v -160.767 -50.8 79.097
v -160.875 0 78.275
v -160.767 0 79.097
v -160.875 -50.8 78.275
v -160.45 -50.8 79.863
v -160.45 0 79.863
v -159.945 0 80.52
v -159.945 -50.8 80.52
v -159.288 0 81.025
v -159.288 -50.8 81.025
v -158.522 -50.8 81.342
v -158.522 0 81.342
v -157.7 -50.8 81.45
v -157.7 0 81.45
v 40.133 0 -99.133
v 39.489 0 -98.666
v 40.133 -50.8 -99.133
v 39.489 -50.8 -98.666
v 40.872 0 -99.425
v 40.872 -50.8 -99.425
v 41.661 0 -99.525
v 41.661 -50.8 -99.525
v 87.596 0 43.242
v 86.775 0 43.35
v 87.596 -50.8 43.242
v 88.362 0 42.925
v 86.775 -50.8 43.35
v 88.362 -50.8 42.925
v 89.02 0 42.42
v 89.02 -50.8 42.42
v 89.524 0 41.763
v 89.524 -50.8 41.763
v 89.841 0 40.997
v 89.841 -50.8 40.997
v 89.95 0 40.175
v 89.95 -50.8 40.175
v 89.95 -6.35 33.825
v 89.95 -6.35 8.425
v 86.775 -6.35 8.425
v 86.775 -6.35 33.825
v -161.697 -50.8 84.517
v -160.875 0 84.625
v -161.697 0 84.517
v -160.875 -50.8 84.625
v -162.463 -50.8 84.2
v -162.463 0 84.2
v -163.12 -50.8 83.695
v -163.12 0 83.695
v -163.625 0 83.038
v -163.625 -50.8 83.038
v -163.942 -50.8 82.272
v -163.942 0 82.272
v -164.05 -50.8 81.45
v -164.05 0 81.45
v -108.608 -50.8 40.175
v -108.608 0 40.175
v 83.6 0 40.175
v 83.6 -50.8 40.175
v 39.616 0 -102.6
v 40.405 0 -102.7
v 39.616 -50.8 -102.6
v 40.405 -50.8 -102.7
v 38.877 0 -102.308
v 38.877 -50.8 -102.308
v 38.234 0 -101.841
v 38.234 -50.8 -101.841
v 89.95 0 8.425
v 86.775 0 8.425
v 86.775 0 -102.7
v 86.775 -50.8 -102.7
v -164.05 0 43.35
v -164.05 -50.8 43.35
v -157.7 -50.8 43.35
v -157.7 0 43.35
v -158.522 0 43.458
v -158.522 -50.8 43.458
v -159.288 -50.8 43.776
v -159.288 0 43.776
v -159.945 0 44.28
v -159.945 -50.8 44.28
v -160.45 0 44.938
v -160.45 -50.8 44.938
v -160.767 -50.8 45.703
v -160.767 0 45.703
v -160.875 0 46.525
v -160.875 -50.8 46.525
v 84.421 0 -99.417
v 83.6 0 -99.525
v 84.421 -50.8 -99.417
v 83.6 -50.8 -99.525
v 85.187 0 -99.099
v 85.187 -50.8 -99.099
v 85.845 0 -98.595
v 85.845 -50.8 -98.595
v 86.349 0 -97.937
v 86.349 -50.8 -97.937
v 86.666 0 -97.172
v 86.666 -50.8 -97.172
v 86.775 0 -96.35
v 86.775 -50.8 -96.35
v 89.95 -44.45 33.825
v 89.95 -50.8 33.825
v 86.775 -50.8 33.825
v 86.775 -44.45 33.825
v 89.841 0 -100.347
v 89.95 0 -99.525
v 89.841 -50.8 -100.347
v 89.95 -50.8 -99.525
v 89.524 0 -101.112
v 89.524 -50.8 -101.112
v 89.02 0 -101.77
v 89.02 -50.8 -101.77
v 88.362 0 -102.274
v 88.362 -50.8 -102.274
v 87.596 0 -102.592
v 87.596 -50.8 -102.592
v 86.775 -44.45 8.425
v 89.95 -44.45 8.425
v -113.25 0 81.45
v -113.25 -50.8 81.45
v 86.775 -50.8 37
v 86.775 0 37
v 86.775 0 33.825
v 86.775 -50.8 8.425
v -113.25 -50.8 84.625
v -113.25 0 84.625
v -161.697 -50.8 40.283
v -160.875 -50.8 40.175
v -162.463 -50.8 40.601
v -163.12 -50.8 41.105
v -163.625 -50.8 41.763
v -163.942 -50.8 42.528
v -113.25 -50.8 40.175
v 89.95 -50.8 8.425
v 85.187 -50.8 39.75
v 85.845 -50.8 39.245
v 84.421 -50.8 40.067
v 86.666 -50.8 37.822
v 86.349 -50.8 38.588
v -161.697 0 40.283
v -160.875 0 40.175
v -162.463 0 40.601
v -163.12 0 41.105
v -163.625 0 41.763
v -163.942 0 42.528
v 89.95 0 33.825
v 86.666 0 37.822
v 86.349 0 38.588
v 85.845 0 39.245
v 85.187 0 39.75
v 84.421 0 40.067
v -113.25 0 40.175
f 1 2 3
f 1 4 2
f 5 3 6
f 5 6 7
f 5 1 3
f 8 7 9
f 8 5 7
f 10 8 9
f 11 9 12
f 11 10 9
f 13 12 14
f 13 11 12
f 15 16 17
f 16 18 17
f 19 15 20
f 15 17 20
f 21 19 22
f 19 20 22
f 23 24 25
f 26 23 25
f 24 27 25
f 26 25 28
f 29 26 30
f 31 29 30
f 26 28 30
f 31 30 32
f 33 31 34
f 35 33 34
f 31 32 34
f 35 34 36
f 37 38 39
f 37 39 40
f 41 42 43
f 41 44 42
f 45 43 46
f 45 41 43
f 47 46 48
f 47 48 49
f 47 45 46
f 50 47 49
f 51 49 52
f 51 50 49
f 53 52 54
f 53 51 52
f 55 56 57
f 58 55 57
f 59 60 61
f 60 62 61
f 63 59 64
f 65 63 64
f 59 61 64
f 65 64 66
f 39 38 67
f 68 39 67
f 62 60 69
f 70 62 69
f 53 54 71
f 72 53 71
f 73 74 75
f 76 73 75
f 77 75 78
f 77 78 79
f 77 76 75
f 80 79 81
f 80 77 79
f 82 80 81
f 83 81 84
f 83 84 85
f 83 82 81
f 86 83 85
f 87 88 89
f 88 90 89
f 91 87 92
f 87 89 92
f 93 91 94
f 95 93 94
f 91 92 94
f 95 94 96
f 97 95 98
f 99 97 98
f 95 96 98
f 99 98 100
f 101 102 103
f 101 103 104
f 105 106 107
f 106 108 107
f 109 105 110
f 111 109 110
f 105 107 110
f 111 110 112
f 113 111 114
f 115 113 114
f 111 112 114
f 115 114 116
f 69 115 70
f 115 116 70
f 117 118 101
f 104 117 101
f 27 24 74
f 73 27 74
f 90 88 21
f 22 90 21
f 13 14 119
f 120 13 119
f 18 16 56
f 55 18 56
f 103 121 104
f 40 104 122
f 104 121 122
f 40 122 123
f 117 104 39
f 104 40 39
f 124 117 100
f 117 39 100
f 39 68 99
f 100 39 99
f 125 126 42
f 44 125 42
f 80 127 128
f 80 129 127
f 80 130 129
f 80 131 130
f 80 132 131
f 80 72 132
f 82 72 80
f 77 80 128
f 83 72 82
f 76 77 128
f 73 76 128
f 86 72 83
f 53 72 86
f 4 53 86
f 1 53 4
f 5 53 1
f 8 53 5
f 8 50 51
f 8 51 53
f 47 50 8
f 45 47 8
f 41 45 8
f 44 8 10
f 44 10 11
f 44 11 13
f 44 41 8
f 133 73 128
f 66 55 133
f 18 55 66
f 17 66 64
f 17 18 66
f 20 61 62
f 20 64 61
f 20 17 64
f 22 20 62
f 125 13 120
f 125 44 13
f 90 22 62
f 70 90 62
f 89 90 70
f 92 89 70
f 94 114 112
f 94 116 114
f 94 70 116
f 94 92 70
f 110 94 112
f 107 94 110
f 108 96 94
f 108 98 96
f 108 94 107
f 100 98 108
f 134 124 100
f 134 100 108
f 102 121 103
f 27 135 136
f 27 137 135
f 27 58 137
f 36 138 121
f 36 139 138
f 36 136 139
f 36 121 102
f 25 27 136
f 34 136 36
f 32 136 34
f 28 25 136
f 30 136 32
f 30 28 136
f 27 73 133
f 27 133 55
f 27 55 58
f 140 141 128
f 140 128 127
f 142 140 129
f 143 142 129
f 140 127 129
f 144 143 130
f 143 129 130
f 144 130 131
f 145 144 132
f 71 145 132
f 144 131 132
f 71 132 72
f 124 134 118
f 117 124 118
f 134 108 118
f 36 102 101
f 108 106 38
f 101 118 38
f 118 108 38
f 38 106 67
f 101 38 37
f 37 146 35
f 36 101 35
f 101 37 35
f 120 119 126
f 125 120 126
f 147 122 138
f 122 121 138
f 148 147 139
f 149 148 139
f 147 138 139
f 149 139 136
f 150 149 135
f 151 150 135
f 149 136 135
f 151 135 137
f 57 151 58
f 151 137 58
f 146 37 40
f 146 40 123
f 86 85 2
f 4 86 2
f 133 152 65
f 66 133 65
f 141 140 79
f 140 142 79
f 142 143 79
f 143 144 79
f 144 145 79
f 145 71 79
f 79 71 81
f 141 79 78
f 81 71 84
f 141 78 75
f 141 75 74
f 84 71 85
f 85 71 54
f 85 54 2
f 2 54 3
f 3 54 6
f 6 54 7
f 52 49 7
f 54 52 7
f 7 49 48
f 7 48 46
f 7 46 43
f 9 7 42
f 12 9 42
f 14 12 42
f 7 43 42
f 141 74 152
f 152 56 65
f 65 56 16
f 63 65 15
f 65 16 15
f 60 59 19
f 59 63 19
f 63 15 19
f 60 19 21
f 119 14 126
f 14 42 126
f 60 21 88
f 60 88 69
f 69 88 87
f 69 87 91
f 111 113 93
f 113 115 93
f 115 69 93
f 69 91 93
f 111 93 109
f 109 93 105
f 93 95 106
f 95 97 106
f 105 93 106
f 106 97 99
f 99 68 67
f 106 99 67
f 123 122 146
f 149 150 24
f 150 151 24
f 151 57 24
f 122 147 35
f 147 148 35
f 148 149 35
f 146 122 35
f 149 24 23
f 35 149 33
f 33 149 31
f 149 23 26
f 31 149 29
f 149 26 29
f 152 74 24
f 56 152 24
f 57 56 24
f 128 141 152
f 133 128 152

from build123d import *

# Parameters (mm, degrees)
F1_DEPTH = 50.8
F2_R     = 3.175
F4_W     = 6.35
F4_H     = 25.4
F5_DEPTH = 25.4


# Not quite as in the source:
# - two fillets or chamfers of one size are made in one step
# - a feature names something its author has since deleted; it is built from what else it names


with BuildPart() as f1:
    # F0 (on Front) → F1 (new body)
    with BuildSketch(Plane.XZ):
        Polygon((89.9496172311, 43.3501401251), (-160.8753827689, 43.3501401251), (-160.8753827689, 81.4501401251), (-113.2503827689, 81.4501401251), (-113.2503827689, 84.6251401251), (-164.0503827689, 84.6251401251), (-164.0503827689, 40.1751401251), (-113.2503827689, 40.1751401251), (39.1496172311, -102.6998598749), (89.9496172311, -102.6998598749), align=None)
        Polygon((-108.6081703534, 40.1751401251), (86.7746172311, 40.1751401251), (86.7746172311, -99.5248598749), (40.4051629799, -99.5248598749), align=None, mode=Mode.SUBTRACT)
    extrude(amount=F1_DEPTH)

    # F2
    f2_edges = [f1.edges().sort_by_distance(p)[0] for p in [
        (-164.050383, -25.4, 84.62514),
        (-160.875383, -25.4, 43.35014),
        (89.949617, -25.4, 43.35014),
        (89.949617, -25.4, -102.69986),
        (-164.050383, -25.4, 40.17514),
        (-160.875383, -25.4, 81.45014),
        (39.149617, -25.4, -102.69986),
        (40.405163, -25.4, -99.52486),
        (86.774617, -25.4, 40.17514),
        (86.774617, -25.4, -99.52486),
    ]]
    fillet(f2_edges, radius=F2_R)

    # F4 (on face) → F5 (cut)
    with BuildSketch(Plane.YZ.offset(89.9496172311)):
        with Locations((-3.175, 21.1251401251)):
            Rectangle(F4_W, F4_H)
        with Locations((-47.625, 21.1251401251)):
            Rectangle(F4_W, F4_H)
    extrude(amount=-F5_DEPTH, mode=Mode.SUBTRACT)


solid = f1.part
